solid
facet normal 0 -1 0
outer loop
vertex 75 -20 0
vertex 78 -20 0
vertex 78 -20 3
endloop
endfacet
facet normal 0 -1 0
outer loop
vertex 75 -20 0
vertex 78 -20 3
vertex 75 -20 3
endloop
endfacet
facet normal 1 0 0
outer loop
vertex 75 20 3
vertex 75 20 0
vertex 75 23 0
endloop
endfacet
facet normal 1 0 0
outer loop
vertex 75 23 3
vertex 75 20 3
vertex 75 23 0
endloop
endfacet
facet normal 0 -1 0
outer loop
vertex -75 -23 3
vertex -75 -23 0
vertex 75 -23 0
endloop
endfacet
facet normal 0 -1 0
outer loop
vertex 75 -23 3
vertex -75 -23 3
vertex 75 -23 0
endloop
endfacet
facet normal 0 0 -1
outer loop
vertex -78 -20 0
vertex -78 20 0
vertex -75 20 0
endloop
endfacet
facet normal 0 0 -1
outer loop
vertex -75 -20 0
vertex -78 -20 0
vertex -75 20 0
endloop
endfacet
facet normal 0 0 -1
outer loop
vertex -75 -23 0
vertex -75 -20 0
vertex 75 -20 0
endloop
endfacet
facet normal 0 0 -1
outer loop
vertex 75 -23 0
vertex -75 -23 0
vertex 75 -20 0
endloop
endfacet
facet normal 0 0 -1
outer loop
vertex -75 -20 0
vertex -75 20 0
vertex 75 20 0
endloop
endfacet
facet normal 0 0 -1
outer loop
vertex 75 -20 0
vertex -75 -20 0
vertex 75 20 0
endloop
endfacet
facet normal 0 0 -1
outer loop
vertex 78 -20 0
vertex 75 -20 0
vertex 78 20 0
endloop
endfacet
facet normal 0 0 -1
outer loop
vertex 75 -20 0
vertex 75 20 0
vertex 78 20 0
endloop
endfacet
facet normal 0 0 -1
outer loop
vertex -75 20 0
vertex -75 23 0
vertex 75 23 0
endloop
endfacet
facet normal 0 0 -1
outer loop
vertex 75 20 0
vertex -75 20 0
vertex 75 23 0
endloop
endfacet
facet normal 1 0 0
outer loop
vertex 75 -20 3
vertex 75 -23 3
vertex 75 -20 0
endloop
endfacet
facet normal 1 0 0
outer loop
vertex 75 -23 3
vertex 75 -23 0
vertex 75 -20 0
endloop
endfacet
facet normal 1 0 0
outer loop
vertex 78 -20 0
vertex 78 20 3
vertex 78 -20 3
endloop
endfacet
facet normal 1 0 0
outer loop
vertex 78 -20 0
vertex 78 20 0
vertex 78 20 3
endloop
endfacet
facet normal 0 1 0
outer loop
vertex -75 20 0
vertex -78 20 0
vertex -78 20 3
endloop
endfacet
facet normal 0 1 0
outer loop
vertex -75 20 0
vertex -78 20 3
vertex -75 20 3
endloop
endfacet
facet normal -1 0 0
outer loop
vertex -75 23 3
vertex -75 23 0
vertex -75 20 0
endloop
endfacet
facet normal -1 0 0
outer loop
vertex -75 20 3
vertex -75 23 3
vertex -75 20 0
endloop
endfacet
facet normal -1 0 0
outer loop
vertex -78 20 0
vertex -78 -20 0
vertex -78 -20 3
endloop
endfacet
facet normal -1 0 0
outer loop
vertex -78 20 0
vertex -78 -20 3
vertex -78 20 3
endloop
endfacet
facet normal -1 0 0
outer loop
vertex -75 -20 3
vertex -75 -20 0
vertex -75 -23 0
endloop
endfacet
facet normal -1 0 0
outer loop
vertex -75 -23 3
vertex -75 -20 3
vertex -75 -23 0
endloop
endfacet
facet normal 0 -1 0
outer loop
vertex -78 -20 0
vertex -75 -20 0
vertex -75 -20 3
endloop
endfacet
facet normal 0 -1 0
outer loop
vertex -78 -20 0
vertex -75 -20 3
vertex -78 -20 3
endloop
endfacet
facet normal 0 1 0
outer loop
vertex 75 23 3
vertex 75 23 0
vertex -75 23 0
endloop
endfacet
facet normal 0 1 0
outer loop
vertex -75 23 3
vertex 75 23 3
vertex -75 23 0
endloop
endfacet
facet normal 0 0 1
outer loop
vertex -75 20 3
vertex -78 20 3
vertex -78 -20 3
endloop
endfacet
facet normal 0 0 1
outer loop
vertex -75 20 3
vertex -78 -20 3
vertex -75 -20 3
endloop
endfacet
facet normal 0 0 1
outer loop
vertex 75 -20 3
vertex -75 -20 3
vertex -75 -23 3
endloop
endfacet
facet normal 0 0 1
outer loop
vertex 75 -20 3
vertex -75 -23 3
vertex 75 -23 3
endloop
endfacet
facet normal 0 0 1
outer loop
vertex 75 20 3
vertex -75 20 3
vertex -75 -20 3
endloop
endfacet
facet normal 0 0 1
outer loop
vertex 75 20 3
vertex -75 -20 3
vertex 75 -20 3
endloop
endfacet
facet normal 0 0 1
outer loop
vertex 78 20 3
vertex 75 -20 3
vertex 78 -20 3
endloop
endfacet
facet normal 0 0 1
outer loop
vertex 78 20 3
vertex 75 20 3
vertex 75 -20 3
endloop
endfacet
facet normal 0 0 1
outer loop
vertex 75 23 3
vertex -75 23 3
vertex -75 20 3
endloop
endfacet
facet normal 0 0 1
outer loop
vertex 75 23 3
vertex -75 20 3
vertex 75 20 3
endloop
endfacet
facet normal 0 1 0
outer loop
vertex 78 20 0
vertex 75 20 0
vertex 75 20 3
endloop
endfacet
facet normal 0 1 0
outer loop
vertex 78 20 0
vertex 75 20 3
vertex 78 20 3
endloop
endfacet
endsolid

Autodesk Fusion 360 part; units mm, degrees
sketch "Esquisse1" plane through (0, 0, 0) normal (0, 0, 1) x (1, 0, 0)
  line L0 (75, 23) -> (-75, 23)
  line L1 (-75, 23) -> (-75, -23)
  line L2 (-75, -23) -> (75, -23)
  line L3 (75, -23) -> (75, 23)
  line L4 (75, 23) -> (-75, -23) construction
  line L5 (-75, 23) -> (75, -23) construction
  line L6 (78, -20) -> (-78, -20)
  line L7 (-78, -20) -> (-78, 20)
  line L8 (-78, 20) -> (78, 20)
  line L9 (78, 20) -> (78, -20)
  line L10 (78, -20) -> (-78, 20) construction
  line L11 (-78, -20) -> (78, 20) construction
  dimension "d1" = 150
  dimension "d2" = 156
  dimension "d3" = 40
  dimension "d4" = 46
extrude "Extrusion1" add sketch "Esquisse1" along normal blind 3
equation "d2 = d1 + ( 2 * 3 ) * 1 mm"
equation "d4 = d3 + ( 2 * 3 ) * 1 mm"
equation "Transfo_notch_larg_Ref = 1.6 mm" comment "epaisseur des encoches du transfo"
equation "Trasnfo_notch_long_Ref = 4 mm" comment "Longueurs des encoches du transfo"
equation "Transfo_Dist_Larg_2_notchs_Ref = 11.9 mm" comment "Distance entre deux encoches (largeur)"
equation "Transfo_Dist_Long_2_nothcs_Ref = 39 mm - ( 2 * 1.6 ) * 1 mm" comment "Distance (longueur) entre deux encoches"
equation "Transfo_Hole_Diam_Ref = 3.7 mm" comment "Diamètre des trous du transfo"
equation "Transfo_Dist_2_Hole_Ref = 16.7 mm" comment "Distance entre les centres des trous du transfo"
equation "Transfo_Dist_Notch_Hole_Ref = 69.2 mm" comment "Distance (minimal) entre les encoches et les trous"
